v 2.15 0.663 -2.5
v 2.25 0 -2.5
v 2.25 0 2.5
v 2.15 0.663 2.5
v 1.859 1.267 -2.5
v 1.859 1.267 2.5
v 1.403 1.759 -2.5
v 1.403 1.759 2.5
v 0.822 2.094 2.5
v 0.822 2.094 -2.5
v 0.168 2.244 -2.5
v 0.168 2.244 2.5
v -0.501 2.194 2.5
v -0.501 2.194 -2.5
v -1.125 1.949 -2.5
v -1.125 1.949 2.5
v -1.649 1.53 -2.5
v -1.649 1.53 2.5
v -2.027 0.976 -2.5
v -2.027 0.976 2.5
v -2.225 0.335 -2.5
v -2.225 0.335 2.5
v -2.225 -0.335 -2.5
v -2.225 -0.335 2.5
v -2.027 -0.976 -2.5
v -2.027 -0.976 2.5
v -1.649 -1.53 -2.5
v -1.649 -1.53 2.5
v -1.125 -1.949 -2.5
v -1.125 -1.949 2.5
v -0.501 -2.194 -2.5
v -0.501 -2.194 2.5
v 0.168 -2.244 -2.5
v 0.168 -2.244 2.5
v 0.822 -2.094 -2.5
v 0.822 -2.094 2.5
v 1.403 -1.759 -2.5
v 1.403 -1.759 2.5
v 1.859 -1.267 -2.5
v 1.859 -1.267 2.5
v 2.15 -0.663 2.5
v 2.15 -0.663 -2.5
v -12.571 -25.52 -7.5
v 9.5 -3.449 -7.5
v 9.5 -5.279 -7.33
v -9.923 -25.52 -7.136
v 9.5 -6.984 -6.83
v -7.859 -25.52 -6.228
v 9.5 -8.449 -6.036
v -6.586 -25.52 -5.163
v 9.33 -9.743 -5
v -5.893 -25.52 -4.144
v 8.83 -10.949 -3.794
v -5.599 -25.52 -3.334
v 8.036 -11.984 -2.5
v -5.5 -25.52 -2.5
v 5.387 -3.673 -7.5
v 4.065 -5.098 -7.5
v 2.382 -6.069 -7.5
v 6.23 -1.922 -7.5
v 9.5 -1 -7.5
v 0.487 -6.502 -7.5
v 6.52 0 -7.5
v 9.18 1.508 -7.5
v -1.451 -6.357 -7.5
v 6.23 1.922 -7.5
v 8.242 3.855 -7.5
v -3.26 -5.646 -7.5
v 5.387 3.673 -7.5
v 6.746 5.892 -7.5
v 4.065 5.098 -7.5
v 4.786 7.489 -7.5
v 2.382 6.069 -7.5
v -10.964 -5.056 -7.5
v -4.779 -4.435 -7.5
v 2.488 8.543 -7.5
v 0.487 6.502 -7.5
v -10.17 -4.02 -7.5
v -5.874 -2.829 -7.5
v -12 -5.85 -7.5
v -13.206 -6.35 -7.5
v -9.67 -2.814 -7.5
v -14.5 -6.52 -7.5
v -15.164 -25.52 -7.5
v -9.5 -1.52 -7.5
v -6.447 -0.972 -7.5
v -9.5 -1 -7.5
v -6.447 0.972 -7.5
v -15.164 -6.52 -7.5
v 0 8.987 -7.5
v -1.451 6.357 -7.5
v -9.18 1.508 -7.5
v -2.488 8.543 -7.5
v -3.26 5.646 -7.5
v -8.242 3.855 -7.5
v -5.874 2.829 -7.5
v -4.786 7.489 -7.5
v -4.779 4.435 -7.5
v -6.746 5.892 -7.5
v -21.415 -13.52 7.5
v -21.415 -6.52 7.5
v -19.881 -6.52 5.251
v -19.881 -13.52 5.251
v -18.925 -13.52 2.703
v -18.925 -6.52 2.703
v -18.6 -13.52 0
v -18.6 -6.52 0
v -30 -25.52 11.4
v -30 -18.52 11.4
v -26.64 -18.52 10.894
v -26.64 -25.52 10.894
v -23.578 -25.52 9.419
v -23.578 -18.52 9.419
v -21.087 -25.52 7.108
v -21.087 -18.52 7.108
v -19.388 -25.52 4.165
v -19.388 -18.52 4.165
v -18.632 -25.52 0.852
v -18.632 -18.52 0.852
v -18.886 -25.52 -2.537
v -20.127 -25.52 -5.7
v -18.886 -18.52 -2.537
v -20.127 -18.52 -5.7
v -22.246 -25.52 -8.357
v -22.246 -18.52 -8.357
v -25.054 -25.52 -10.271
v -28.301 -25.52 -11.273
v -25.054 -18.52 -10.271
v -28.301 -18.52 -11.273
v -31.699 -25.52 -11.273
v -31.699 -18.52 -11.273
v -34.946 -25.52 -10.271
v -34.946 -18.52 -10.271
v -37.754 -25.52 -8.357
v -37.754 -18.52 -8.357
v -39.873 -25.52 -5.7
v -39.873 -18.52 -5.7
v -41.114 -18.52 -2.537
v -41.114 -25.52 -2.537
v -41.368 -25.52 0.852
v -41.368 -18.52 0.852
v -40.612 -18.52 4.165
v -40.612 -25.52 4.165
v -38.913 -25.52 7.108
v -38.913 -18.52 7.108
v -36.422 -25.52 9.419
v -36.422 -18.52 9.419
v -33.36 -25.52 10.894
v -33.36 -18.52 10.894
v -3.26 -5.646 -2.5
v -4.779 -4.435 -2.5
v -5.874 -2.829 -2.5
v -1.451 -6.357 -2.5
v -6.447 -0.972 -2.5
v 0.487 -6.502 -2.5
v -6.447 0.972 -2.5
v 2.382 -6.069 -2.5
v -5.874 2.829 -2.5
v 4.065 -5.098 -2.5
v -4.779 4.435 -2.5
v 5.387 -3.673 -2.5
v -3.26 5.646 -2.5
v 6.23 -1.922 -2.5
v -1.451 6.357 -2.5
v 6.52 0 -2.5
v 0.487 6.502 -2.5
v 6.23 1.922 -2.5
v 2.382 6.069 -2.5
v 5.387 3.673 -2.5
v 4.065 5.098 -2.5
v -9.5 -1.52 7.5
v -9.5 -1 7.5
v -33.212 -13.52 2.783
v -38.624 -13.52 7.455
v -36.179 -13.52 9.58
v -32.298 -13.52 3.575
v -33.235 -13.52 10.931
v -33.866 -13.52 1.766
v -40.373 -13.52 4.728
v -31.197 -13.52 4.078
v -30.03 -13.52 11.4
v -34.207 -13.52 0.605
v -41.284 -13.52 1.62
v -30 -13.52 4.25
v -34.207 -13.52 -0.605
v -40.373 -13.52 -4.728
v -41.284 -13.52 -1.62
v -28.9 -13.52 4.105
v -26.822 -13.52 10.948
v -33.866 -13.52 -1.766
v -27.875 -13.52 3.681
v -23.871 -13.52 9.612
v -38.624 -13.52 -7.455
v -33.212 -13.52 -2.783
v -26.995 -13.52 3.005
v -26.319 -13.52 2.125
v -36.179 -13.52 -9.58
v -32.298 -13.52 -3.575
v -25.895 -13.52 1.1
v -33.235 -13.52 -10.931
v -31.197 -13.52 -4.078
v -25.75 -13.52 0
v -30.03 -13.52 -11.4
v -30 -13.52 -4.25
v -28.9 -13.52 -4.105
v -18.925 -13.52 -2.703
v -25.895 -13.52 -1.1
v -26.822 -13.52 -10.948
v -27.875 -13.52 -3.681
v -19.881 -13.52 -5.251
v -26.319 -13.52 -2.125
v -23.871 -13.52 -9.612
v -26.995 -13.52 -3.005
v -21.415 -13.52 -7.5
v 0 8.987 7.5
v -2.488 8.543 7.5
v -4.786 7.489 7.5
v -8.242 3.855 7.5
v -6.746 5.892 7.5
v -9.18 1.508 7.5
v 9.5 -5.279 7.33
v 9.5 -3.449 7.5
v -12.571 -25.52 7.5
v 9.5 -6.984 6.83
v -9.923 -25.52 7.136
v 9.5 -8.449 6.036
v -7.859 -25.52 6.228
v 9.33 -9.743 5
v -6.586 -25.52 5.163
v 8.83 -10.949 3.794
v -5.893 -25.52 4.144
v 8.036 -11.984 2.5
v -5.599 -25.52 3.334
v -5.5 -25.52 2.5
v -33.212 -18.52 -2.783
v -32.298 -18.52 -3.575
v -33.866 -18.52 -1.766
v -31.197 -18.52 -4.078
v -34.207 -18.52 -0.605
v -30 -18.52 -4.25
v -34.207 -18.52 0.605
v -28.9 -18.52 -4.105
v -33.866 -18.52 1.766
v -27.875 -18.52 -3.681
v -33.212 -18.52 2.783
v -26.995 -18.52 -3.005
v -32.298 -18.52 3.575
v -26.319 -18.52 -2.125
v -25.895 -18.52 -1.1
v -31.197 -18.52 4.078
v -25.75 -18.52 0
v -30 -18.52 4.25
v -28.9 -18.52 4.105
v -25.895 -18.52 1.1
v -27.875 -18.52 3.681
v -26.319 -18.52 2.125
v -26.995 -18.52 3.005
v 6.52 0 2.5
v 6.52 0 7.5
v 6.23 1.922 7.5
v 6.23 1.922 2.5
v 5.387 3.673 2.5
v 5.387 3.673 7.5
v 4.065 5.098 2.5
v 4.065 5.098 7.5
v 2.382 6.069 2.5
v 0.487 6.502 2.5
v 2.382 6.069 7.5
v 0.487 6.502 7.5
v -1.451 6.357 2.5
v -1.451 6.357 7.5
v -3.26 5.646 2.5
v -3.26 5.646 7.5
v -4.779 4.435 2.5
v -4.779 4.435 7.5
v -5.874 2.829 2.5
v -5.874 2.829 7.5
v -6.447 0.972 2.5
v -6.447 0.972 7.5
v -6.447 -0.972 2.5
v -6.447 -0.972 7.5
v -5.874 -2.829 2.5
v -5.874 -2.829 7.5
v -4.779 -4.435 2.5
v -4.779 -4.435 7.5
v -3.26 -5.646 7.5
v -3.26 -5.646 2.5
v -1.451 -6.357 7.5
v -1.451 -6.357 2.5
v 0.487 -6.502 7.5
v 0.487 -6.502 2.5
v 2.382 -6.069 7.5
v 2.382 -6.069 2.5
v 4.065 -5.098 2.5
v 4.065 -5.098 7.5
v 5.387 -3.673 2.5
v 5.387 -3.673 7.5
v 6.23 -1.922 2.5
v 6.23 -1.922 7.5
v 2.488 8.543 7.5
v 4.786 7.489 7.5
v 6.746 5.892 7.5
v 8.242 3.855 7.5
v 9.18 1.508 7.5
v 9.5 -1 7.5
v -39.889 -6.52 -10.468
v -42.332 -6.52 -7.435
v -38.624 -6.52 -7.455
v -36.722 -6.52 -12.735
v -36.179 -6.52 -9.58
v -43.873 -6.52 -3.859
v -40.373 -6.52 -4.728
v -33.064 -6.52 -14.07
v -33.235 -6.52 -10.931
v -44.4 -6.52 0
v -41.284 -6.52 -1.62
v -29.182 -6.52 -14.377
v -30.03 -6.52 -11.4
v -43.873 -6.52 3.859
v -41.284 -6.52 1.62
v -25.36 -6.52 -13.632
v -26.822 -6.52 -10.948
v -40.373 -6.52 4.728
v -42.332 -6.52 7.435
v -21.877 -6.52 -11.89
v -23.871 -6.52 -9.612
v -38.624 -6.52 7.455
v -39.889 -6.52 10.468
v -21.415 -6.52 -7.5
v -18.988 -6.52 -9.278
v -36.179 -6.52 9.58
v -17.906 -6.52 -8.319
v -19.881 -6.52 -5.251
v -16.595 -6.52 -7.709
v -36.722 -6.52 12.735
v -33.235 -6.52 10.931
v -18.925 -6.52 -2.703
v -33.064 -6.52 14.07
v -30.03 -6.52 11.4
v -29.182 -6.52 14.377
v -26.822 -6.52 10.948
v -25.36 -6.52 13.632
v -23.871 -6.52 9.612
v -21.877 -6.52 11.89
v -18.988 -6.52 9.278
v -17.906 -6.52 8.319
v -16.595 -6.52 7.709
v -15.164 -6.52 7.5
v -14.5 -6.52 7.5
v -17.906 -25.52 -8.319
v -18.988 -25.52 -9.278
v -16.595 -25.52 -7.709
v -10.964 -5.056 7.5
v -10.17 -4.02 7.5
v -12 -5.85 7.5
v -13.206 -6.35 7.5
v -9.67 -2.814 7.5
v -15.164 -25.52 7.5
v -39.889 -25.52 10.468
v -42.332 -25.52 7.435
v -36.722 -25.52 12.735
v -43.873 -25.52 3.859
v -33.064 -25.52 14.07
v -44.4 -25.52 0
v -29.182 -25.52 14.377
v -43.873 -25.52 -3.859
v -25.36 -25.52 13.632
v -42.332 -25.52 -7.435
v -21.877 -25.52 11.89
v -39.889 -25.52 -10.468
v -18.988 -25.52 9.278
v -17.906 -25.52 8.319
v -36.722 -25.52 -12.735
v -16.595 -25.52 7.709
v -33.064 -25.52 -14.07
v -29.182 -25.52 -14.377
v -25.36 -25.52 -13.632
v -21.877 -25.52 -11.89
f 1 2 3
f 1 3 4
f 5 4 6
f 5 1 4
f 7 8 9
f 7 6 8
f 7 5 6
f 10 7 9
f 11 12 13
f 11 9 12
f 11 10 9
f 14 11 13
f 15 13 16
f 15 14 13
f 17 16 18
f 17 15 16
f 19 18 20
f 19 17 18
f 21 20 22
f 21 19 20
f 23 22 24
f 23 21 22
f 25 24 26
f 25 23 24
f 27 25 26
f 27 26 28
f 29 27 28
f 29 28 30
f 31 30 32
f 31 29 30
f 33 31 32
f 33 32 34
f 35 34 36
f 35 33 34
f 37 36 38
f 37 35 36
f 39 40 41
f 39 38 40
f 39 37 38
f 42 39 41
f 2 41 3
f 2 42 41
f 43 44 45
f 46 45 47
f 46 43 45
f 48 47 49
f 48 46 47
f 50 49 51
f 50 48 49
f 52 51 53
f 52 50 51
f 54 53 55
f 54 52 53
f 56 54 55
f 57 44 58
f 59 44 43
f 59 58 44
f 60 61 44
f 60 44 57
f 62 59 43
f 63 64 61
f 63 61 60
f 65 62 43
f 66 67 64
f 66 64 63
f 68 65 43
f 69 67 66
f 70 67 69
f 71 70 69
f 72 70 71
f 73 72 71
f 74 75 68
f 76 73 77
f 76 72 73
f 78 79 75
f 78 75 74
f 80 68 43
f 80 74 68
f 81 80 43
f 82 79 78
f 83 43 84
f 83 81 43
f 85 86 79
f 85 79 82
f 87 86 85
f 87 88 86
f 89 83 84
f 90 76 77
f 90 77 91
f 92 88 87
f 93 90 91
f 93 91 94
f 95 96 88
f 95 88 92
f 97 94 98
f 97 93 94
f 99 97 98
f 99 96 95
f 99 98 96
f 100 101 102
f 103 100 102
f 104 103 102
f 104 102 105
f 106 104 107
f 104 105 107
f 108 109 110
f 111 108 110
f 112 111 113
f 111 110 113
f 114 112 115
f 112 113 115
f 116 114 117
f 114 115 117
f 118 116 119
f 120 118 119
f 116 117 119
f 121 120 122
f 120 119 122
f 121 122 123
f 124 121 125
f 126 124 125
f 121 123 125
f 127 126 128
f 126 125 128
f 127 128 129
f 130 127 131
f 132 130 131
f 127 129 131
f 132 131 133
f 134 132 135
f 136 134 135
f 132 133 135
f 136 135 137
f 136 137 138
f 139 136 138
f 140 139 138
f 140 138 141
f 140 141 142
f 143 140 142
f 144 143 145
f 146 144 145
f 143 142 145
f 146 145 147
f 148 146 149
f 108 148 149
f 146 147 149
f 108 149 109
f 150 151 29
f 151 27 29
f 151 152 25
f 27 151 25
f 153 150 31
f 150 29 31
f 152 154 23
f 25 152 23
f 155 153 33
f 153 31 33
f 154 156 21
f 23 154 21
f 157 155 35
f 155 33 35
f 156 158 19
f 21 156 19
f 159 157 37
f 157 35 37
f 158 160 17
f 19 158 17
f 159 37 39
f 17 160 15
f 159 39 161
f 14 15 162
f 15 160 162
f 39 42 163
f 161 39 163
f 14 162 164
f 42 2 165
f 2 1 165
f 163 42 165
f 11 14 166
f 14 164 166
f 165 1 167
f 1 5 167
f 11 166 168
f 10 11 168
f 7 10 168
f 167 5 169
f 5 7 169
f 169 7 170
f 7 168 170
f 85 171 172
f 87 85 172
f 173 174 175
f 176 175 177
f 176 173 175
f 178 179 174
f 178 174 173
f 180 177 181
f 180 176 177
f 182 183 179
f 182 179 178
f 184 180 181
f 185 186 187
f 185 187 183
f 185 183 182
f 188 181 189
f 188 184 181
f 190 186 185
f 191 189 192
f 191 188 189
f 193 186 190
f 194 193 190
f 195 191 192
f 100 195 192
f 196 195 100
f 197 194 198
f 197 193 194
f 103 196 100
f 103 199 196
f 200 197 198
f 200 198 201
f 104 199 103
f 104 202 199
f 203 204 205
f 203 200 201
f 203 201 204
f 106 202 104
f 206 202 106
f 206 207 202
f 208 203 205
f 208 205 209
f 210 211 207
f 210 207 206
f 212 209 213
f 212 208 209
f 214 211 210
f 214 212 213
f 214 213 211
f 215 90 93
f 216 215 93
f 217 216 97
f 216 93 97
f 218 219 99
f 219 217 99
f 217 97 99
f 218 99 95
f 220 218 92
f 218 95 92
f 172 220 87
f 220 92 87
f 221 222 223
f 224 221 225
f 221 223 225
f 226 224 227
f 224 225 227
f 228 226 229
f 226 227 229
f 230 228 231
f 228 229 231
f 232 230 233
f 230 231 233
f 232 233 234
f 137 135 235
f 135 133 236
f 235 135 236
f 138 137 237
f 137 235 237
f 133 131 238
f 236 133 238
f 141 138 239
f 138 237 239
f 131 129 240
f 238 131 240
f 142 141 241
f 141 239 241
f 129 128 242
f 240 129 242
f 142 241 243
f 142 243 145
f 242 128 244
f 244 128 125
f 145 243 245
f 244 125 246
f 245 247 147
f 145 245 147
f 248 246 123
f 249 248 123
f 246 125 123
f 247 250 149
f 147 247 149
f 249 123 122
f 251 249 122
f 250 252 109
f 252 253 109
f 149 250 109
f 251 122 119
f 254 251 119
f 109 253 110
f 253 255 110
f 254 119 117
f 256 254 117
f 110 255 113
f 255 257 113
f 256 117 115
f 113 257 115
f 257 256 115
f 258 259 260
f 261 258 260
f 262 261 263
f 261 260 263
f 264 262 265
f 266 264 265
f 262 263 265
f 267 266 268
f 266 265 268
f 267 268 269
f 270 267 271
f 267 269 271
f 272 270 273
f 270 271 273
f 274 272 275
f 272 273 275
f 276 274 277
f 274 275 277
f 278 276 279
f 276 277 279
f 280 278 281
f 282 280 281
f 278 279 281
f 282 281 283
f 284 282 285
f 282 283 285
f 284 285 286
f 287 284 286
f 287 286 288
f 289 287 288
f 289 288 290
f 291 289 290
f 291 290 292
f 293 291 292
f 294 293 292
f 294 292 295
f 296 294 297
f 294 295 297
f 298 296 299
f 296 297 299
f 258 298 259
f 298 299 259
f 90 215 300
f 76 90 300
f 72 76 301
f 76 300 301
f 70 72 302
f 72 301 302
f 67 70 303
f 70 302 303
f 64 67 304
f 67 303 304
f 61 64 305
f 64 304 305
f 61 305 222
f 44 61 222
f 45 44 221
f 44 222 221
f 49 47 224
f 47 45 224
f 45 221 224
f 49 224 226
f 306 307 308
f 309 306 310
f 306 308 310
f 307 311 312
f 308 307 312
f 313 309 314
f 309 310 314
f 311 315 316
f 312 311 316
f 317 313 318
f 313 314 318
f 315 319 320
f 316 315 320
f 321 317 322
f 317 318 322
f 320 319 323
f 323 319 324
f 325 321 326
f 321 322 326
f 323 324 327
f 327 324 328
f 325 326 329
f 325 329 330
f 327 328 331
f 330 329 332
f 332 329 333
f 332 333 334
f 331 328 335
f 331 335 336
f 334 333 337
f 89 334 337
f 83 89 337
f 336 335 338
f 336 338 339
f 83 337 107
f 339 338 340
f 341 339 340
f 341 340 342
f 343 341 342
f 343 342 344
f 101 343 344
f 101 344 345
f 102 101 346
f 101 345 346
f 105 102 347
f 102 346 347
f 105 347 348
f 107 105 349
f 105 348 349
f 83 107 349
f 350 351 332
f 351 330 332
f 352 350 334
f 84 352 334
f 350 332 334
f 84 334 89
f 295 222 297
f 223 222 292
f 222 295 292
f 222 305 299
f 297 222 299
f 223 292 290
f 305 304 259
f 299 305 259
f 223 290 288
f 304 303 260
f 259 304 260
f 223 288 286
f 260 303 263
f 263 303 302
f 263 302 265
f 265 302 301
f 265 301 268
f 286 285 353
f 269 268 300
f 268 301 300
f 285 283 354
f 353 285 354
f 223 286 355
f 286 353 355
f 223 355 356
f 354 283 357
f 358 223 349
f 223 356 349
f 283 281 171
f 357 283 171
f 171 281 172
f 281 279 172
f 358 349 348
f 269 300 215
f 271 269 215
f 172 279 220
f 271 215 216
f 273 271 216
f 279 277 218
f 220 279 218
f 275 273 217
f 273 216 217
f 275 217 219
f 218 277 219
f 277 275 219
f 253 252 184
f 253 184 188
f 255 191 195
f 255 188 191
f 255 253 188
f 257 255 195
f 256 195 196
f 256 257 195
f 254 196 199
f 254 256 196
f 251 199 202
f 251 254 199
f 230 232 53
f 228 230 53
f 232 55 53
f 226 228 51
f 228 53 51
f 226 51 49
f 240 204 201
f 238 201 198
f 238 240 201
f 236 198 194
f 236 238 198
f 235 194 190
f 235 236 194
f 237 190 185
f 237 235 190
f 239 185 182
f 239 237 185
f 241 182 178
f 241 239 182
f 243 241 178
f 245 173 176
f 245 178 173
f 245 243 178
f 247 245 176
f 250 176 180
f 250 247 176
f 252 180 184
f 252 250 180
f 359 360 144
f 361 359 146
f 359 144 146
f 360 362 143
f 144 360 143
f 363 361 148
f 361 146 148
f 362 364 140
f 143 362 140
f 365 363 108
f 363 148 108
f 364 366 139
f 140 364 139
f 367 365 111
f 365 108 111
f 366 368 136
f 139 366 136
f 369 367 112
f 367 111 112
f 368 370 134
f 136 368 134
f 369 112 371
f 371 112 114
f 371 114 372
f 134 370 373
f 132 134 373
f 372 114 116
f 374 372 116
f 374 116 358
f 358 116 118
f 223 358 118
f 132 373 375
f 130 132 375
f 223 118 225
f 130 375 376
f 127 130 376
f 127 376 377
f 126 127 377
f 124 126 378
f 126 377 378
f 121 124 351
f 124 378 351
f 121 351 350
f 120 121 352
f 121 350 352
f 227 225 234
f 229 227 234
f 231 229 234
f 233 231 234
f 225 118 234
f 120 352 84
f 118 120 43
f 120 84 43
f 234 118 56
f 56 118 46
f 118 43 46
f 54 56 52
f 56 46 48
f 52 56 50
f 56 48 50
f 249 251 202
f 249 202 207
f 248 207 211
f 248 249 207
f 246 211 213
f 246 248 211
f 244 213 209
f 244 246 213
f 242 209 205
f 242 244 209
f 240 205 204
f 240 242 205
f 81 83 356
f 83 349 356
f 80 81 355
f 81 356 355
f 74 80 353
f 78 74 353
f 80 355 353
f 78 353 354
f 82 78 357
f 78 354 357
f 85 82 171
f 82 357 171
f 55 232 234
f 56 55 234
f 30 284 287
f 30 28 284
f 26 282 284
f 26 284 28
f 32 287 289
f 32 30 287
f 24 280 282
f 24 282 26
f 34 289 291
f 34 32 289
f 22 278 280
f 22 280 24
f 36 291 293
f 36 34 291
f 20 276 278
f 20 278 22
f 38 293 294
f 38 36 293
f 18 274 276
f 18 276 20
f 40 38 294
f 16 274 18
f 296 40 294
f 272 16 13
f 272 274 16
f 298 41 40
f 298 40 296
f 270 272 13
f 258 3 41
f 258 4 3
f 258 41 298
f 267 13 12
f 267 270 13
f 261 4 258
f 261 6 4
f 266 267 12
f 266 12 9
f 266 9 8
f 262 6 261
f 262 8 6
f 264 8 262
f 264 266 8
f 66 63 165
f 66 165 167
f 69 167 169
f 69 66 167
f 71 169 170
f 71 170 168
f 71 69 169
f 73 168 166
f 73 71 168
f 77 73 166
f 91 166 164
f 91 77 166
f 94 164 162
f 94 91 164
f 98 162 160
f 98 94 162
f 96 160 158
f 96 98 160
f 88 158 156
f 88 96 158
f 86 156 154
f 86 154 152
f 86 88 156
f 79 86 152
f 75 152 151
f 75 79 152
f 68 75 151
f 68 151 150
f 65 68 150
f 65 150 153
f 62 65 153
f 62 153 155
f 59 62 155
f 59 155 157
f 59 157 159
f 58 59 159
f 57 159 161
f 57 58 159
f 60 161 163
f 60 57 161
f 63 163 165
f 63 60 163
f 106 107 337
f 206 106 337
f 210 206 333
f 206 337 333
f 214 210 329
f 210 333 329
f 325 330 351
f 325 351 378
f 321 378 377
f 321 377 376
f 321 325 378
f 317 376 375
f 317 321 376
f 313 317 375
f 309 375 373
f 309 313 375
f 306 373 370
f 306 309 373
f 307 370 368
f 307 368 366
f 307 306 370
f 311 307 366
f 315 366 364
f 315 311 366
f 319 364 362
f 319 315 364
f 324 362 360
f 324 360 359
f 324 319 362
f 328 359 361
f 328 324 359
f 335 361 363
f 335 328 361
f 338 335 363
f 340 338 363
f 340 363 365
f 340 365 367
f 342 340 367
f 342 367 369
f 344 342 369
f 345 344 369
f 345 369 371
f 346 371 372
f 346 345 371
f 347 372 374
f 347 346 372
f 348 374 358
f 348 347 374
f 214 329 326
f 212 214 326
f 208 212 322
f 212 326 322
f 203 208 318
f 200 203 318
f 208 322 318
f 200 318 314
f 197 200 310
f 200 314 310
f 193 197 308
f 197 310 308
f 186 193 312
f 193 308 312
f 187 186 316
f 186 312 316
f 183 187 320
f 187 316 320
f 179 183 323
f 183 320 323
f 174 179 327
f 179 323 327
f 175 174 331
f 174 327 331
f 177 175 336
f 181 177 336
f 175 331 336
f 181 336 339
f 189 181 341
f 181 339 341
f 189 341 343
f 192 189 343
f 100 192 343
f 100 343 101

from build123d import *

# Parameters (mm, degrees)
SKETCH1_R               = 2.25
BOSS_EXTRUDE1_DEPTH     = 7.5
CUT_EXTRUDE1_START      = 7.5
SKETCH1_3_R             = 6.52
CUT_EXTRUDE1_DEPTH      = 5
CUT_EXTRUDE2_START      = -7.5
SKETCH1_4_R             = 6.52
CUT_EXTRUDE2_DEPTH      = 5
SKETCH2_R               = 14.4
BOSS_EXTRUDE2_DEPTH     = 19
CUT_EXTRUDE3_DEPTH      = 51.395634732
CUT_EXTRUDE3_DEPTH_BACK = 51.395634732
CUT_EXTRUDE4_DEPTH      = 7
CUT_EXTRUDE5_START      = -12
SKETCH2_5_R             = 11.4
CUT_EXTRUDE5_DEPTH      = 7
FILLET1_R               = 5
FILLET2_R               = 10
FILLET3_R               = 5


with BuildPart() as part:
    # Sketch1 → Boss-Extrude1 (new, symmetric)
    with BuildSketch(Plane.XY):
        Polygon((-9.5, 9), (9.5, 9), (9.5, -10.52), (-5.5, -25.52), (-30, -25.52), (-30, -6.52), (-9.5, -6.52), align=None)
        Circle(SKETCH1_R, mode=Mode.SUBTRACT)
    extrude(amount=BOSS_EXTRUDE1_DEPTH, both=True)

    # Sketch1<3> → Cut-Extrude1 (cut)
    with BuildSketch(Plane.XY.offset(CUT_EXTRUDE1_START)):
        Circle(SKETCH1_3_R)
    extrude(amount=-CUT_EXTRUDE1_DEPTH, mode=Mode.SUBTRACT)

    # Sketch1<4> → Cut-Extrude2 (cut)
    with BuildSketch(Plane.XY.offset(CUT_EXTRUDE2_START)):
        Circle(SKETCH1_4_R)
    extrude(amount=CUT_EXTRUDE2_DEPTH, mode=Mode.SUBTRACT)

    # Sketch2 → Boss-Extrude2 (add, through all)
    with BuildSketch(Plane(origin=(0, -6.52, 0), x_dir=(1, 0, 0), z_dir=(0, 1, 0))):
        with Locations((-30, 0)):
            Circle(SKETCH2_R)
    extrude(amount=-BOSS_EXTRUDE2_DEPTH)

    # Sketch2<3> → Cut-Extrude3 (cut, two sides: drawn at the far end of the back side and taken through both)
    with BuildSketch(Plane(origin=(0, -6.52, 0), x_dir=(1, 0, 0), z_dir=(0, 1, 0)).offset(-CUT_EXTRUDE3_DEPTH_BACK)):
        with BuildLine():
            ThreePointArc((-30, -4.25), (-26.99479618, -3.00520382), (-25.75, 0))
            ThreePointArc((-25.75, 0), (-26.99479618, 3.00520382), (-30, 4.25))
            Line((-30, 4.25), (-30, -4.25))
        make_face()
        with BuildLine():
            Line((-30, -4.25), (-30, 4.25))
            ThreePointArc((-30, 4.25), (-34.25, 0), (-30, -4.25))
        make_face()
    extrude(amount=CUT_EXTRUDE3_DEPTH + CUT_EXTRUDE3_DEPTH_BACK, mode=Mode.SUBTRACT)

    # Sketch2<4> → Cut-Extrude4 (cut)
    with BuildSketch(Plane(origin=(0, -6.52, 0), x_dir=(1, 0, 0), z_dir=(0, 1, 0))):
        with BuildLine():
            ThreePointArc((-21.414547187, -7.5), (-19.326805491, -4.005361278), (-18.6, 0))
            ThreePointArc((-18.6, 0), (-19.326805491, 4.005361278), (-21.414547187, 7.5))
            Line((-21.414547187, 7.5), (-30, 7.5))
            Line((-30, 7.5), (-30, 4.25))
            ThreePointArc((-30, 4.25), (-26.99479618, 3.00520382), (-25.75, 0))
            ThreePointArc((-25.75, 0), (-26.99479618, -3.00520382), (-30, -4.25))
            Line((-30, -4.25), (-30, -7.5))
            Line((-30, -7.5), (-21.414547187, -7.5))
        make_face()
        with BuildLine():
            Line((-30, 7.5), (-21.414547187, 7.5))
            ThreePointArc((-21.414547187, 7.5), (-41.4, 0), (-21.414547187, -7.5))
            Line((-21.414547187, -7.5), (-30, -7.5))
            Line((-30, -7.5), (-30, -4.25))
            ThreePointArc((-30, -4.25), (-34.25, 0), (-30, 4.25))
            Line((-30, 4.25), (-30, 7.5))
        make_face()
    extrude(amount=-CUT_EXTRUDE4_DEPTH, mode=Mode.SUBTRACT)

    # Sketch2<5> → Cut-Extrude5 (cut)
    with BuildSketch(Plane(origin=(0, -6.52, 0), x_dir=(1, 0, 0), z_dir=(0, 1, 0)).offset(CUT_EXTRUDE5_START)):
        with Locations(Location((-30, 0, 0), (0, 0, 270))):
            Circle(SKETCH2_5_R)
    extrude(amount=-CUT_EXTRUDE5_DEPTH, mode=Mode.SUBTRACT)

    # Fillet1
    fillet1_edges = [part.edges().sort_by_distance(p)[0] for p in [
        (-9.5, -6.52, 0),
        (-17.707319251, -16.02, -7.5),
        (-17.707319251, -16.02, 7.5),
    ]]
    fillet(fillet1_edges, radius=FILLET1_R)

    # Fillet2
    # the kernel refuses this fillet: 10 mm, written as the material it takes off along each edge
    with BuildSketch(Plane(origin=(-9.5, 9, -32.5), x_dir=(0, -1, 0), z_dir=(0, 0, 1))) as fillet2_piece_1:
        with BuildLine():
            CenterArc((FILLET2_R, FILLET2_R), FILLET2_R, 180, 90)
            Line((0, FILLET2_R), (0, 0))
            Line((0, 0), (FILLET2_R, 0))
        make_face()
    extrude(amount=65, mode=Mode.SUBTRACT)
    with BuildSketch(Plane(origin=(9.5, 9, 32.5), x_dir=(-1, 0, 0), z_dir=(0, 0, -1))) as fillet2_piece_2:
        with BuildLine():
            CenterArc((FILLET2_R, -FILLET2_R), FILLET2_R, 90, 90)
            Line((0, -FILLET2_R), (0, 0))
            Line((0, 0), (FILLET2_R, 0))
        make_face()
    extrude(amount=65, mode=Mode.SUBTRACT)

    # Fillet3
    fillet3_edges = [part.edges().sort_by_distance(p)[0] for p in [
        (2, -18.02, -7.5),
        (9.5, -10.52, 0),
        (2, -18.02, 7.5),
    ]]
    fillet(fillet3_edges, radius=FILLET3_R)


solid = part.part
